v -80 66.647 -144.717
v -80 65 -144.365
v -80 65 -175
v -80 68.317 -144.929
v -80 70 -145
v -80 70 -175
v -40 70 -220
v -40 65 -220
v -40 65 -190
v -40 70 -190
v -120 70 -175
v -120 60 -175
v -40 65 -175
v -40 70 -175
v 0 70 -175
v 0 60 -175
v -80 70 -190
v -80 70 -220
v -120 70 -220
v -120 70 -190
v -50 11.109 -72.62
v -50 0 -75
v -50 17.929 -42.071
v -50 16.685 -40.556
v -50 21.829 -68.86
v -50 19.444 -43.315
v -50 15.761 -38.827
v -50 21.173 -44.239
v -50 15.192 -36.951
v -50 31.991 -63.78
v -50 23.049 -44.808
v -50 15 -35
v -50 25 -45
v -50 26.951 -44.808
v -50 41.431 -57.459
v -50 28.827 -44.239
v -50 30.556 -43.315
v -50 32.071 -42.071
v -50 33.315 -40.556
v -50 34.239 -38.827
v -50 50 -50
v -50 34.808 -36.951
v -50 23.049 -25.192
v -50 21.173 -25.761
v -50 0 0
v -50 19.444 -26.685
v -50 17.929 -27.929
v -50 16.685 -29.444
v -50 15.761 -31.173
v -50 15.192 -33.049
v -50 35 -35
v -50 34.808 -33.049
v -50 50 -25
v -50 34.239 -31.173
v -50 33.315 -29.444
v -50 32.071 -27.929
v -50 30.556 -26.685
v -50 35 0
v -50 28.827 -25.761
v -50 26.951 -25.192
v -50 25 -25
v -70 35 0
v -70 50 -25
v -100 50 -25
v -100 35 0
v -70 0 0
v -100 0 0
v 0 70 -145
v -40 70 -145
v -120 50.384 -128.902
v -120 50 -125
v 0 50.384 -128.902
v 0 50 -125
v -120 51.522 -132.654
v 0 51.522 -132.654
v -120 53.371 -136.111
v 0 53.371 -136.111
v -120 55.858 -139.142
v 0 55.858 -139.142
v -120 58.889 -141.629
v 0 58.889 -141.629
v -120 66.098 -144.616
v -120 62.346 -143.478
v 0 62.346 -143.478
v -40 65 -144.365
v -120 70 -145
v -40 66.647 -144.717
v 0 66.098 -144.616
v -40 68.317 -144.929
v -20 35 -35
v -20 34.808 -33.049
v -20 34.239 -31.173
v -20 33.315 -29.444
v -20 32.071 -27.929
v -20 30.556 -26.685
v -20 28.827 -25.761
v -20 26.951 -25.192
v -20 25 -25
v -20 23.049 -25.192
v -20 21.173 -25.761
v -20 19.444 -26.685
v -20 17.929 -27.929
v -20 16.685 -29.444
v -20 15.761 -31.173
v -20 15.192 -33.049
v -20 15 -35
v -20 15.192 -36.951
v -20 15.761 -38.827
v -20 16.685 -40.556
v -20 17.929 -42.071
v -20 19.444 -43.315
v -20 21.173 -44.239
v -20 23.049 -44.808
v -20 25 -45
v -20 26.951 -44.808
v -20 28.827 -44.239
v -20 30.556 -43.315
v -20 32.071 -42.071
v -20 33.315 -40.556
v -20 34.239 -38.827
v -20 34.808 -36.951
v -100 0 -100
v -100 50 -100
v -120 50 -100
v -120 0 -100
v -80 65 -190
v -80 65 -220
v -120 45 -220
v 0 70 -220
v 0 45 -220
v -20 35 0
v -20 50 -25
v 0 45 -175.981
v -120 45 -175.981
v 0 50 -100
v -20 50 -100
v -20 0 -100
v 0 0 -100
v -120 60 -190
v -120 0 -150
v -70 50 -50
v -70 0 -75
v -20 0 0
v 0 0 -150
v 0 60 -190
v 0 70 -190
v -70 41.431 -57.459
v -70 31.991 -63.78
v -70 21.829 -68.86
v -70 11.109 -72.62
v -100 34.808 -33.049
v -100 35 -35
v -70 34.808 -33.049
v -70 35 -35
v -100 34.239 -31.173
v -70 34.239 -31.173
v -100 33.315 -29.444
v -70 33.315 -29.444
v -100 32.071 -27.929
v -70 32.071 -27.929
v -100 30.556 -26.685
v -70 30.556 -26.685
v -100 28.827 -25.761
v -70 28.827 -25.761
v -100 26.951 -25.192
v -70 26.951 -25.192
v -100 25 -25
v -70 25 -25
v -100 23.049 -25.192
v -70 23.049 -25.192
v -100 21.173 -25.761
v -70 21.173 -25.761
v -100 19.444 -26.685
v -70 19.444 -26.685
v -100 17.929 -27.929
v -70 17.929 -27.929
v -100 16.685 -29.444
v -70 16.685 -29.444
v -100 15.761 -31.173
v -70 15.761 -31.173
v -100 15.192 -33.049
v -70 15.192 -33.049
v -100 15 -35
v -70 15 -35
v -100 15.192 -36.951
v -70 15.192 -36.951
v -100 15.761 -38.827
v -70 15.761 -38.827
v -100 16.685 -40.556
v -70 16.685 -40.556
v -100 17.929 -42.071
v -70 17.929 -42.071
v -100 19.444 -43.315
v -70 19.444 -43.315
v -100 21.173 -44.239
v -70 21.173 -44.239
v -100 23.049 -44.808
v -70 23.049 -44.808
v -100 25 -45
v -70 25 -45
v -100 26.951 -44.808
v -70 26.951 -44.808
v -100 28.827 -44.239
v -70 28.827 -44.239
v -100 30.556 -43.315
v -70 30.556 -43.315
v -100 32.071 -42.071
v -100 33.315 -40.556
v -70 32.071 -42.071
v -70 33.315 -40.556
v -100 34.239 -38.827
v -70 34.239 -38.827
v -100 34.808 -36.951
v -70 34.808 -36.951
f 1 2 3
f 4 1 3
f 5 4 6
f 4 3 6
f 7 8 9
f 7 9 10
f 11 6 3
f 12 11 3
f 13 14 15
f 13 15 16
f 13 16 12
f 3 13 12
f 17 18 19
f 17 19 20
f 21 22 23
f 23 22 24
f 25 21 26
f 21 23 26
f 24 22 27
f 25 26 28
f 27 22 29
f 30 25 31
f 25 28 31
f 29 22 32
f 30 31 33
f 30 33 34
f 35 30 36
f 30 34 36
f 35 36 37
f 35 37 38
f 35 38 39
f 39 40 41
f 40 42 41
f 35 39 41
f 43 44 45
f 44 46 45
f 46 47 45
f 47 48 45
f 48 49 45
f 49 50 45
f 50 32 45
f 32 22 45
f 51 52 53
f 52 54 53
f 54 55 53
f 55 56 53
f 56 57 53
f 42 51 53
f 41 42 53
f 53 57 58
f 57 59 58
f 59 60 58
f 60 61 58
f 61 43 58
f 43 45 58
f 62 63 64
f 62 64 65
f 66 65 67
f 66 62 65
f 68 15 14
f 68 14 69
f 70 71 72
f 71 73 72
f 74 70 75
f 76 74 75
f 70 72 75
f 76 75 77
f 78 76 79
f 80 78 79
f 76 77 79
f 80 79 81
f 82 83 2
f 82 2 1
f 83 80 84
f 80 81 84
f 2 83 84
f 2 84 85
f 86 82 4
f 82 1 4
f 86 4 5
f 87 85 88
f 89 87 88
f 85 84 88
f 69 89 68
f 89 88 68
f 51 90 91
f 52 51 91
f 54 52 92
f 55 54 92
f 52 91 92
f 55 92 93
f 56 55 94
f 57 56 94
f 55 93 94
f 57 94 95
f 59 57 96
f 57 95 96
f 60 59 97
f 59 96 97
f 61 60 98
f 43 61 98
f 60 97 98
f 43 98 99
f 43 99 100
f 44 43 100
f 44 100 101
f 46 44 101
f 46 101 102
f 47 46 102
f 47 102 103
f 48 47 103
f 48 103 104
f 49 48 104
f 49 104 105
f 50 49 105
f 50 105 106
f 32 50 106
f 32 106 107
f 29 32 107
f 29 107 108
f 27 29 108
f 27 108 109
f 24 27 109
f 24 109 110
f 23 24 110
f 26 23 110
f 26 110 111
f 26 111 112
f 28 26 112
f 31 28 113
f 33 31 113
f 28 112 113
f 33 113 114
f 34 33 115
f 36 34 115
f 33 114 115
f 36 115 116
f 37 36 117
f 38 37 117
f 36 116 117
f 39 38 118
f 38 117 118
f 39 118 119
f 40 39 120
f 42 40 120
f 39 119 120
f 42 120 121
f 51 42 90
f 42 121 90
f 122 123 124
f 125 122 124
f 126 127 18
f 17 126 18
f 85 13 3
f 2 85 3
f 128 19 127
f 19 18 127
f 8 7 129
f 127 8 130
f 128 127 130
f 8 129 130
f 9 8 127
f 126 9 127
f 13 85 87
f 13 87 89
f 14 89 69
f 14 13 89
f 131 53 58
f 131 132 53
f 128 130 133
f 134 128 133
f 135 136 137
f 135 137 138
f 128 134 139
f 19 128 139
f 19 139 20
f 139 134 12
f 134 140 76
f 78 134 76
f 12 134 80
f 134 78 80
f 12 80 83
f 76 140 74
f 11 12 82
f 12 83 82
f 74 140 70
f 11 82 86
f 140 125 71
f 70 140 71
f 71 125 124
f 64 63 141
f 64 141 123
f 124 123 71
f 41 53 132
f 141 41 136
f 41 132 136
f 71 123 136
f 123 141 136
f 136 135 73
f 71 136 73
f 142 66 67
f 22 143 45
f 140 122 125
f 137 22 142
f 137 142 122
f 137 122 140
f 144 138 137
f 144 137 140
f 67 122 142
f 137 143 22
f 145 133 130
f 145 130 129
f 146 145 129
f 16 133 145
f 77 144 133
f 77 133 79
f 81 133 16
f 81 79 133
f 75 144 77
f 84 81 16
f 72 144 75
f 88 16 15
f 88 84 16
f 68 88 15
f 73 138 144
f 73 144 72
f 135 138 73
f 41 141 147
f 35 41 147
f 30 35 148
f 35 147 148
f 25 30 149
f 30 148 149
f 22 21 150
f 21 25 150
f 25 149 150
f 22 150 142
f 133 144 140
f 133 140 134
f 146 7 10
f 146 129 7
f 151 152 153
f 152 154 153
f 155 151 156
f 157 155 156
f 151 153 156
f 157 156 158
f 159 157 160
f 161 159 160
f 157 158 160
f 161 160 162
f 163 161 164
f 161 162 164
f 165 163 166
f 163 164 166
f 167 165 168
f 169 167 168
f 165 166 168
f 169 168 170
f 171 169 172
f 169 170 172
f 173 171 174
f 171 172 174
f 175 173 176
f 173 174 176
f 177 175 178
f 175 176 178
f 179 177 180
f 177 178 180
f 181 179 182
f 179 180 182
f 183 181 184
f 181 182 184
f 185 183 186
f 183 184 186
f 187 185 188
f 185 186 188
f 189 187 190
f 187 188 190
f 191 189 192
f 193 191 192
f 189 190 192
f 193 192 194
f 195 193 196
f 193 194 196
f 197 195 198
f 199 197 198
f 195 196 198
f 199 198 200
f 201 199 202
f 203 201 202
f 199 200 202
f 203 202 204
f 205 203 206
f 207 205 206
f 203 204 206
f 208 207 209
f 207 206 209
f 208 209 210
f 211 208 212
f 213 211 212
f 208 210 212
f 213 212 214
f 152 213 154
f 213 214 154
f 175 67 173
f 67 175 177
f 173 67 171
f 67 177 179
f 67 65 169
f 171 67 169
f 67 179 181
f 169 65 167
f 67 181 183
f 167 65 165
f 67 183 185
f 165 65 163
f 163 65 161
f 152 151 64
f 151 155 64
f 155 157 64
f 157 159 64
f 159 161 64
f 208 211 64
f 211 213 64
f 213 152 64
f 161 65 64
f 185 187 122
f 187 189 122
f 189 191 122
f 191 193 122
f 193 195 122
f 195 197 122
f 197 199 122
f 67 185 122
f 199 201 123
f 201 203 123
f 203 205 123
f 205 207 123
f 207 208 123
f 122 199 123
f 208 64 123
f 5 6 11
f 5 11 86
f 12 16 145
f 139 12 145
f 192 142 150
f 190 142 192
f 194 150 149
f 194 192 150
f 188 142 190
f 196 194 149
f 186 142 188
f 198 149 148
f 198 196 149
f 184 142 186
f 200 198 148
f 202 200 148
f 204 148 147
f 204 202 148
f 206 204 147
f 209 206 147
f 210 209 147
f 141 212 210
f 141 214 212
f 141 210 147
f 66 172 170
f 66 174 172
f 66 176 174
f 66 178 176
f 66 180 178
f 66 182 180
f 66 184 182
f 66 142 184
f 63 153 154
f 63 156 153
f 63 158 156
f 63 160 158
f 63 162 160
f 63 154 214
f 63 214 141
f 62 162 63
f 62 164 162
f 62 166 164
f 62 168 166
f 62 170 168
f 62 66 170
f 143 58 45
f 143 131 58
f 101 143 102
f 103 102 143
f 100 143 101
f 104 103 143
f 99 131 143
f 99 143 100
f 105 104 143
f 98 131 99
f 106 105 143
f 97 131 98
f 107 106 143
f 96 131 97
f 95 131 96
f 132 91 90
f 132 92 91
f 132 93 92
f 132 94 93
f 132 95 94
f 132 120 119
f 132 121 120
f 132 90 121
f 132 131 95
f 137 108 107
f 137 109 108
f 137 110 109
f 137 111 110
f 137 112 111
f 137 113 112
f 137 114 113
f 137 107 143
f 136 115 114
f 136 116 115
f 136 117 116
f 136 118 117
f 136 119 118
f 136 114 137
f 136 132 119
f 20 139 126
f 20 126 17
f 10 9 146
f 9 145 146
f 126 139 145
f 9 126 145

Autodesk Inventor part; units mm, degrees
ref_plane "XZ Plane" through (0, 0, 0) normal (0, 1, 0) x (-1, 0, 0)
ref_plane "XY Plane" through (0, 0, 0) normal (0, 0, 1) x (1, 0, 0)
sketch "Sketch1" plane through (0, 0, 0) normal (1, 0, 0) x (0, 1, 0)
  point P0 (0, 0)
sketch "Sketch2" plane through (0, 0, 0) normal (1, 0, 0) x (0, 1, 0)
  line L0 (70, -220) -> (0, -220) construction
  line L1 (0, -220) -> (0, 0) construction
  circle A0 centre (25, -35) radius 10
  line L2 (0, 0) -> (0, -150)
  line L3 (0, -150) -> (161.1976, -150) construction
  line L4 (70, -220) -> (45, -220)
  line L5 (70, -220) -> (70, -145)
  line L6 (70, -145) -> (70, -145)
  line L7 (50, -125) -> (50, 0) construction
  line L8 (50, 0) -> (0, 0) construction
  arc A1 (50, -125) -> (70, -145) centre (70, -125) ccw
  line L9 (50, -25) -> (35, 0)
  line L10 (0, -150) -> (116.4137, -150) construction
  line L11 (45, -220) -> (45, -175.9808)
  line L12 (50, -25) -> (50, -125)
  line L13 (35, 0) -> (0, 0)
  line L14 (0, -150) -> (45, -175.9808)
  line L15 (50, 0) -> (50, -50)
  line L16 (0, 0) -> (0, -75)
  circle A2 centre (-13.259, 14.018) radius 90 construction
  arc A3 (0, -75) -> (50, -50) centre (-13.259, 14.018) ccw
  line L17 (70, -190) -> (70, -175)
  line L18 (70, -175) -> (60, -175)
  line L19 (60, -175) -> (60, -190)
  line L20 (60, -190) -> (70, -190)
  point P0 (35, 0)
  point P1 (50, -145)
  point P2 (17.5, 0)
  dimension "d0" = 220
  dimension "d1" = 70
  dimension "d2" = 20
  dimension "d5" = 25
  dimension "d7" = 150
  dimension "d9" = 25
  dimension "d10" = 75
  dimension "d12" = 20
  dimension "d13" = 20
  dimension "d14" = 25
  dimension "d15" = 15
  dimension "d17" = 35
  dimension "d25" = 50
  dimension "d26" = 75
  dimension "d27" = 180
  dimension "d28" = 30
  dimension "d29" = 15
  dimension "d30" = 10
extrude "Extrusion1" add sketch "Sketch2" against normal blind 120
sketch "Sketch3" plane through (0, 70, -145) normal (0, 1, 0) x (1, 0, 0)
  line L0 (0, -145) -> (-120, -145) projected
  line L1 (-60, -145) -> (-60, 75)
  line L2 (0, 75) -> (-120, 75) projected
  line L3 (-120, -145) -> (-120, 75)
  line L4 (-120, 75) -> (0, 75)
  line L5 (0, -145) -> (-120, -145)
  line L6 (0, -145) -> (0, 75)
  line L7 (-100, -145) -> (-20, -145)
  line L8 (-20, -145) -> (-20, -45)
  line L9 (0, 30.9808) -> (-120, 30.9808) projected
  line L10 (-100, -145) -> (-100, -45)
  line L11 (-100, -45) -> (-120, -45)
  line L12 (-20, -45) -> (0, -45)
  dimension "d21" = 80
  dimension "d22" = 100
extrude "Extrusion2" cut sketch "Sketch3" against normal blind 120 contours L0 L8 L12 L6 | L0 L3 L11 L10
extrude "Extrusion3" cut sketch "Sketch2" against normal blind 120 contours L5 L20 L19 L18
ref_plane "Work Plane1" through (-60, 35, 0) normal (1, 0, 0) x (0, 1, 0)
sketch "Sketch4" plane through (-60, 35, 0) normal (1, 0, 0) x (0, 1, 0)
  line L0 (-35, 0) -> (0, 0) projected
  line L1 (-35, 0) -> (0, 0)
  line L2 (0, 0) -> (15, -25) projected
  line L3 (0, 0) -> (15, -25)
  line L4 (-35, 0) -> (-35, -75)
  arc A0 (-35, -75) -> (15, -50) centre (-48.259, 14.018) ccw
  line L5 (15, 0) -> (15, -50)
  line L6 (15, -25) -> (15, -100) projected
  line L7 (15, -50) -> (15, -100)
  line L8 (15, -100) -> (-35, -100)
  line L9 (-35, -100) -> (-35, -75)
  line L10 (15, 0) -> (-35, 0)
  dimension "d9" = 25
  dimension "d33" = 75
  dimension "d34" = 180
  dimension "d35" = 50
extrude "Extrusion4" cut sketch "Sketch4" along normal mid plane 20 contours L0 L2 L5 A0 L4
sketch "Sketch5" plane through (0, 45, -220) normal (0, 0, -1) x (-1, 0, 0)
  line L0 (0, 25) -> (120, 25) projected
  line L1 (60, 25) -> (60, -45) construction
  line L2 (40, 20) -> (80, 20)
  line L3 (40, 20) -> (40, 25)
  line L4 (80, 20) -> (80, 25)
  line L5 (40, 25) -> (80, 25)
  point P0 (0, -45)
  point P1 (60, 20)
  dimension "d38" = 40
  dimension "d39" = 5
extrude "Extrusion5" cut sketch "Sketch5" against normal blind 200
properties part number "thi1"
